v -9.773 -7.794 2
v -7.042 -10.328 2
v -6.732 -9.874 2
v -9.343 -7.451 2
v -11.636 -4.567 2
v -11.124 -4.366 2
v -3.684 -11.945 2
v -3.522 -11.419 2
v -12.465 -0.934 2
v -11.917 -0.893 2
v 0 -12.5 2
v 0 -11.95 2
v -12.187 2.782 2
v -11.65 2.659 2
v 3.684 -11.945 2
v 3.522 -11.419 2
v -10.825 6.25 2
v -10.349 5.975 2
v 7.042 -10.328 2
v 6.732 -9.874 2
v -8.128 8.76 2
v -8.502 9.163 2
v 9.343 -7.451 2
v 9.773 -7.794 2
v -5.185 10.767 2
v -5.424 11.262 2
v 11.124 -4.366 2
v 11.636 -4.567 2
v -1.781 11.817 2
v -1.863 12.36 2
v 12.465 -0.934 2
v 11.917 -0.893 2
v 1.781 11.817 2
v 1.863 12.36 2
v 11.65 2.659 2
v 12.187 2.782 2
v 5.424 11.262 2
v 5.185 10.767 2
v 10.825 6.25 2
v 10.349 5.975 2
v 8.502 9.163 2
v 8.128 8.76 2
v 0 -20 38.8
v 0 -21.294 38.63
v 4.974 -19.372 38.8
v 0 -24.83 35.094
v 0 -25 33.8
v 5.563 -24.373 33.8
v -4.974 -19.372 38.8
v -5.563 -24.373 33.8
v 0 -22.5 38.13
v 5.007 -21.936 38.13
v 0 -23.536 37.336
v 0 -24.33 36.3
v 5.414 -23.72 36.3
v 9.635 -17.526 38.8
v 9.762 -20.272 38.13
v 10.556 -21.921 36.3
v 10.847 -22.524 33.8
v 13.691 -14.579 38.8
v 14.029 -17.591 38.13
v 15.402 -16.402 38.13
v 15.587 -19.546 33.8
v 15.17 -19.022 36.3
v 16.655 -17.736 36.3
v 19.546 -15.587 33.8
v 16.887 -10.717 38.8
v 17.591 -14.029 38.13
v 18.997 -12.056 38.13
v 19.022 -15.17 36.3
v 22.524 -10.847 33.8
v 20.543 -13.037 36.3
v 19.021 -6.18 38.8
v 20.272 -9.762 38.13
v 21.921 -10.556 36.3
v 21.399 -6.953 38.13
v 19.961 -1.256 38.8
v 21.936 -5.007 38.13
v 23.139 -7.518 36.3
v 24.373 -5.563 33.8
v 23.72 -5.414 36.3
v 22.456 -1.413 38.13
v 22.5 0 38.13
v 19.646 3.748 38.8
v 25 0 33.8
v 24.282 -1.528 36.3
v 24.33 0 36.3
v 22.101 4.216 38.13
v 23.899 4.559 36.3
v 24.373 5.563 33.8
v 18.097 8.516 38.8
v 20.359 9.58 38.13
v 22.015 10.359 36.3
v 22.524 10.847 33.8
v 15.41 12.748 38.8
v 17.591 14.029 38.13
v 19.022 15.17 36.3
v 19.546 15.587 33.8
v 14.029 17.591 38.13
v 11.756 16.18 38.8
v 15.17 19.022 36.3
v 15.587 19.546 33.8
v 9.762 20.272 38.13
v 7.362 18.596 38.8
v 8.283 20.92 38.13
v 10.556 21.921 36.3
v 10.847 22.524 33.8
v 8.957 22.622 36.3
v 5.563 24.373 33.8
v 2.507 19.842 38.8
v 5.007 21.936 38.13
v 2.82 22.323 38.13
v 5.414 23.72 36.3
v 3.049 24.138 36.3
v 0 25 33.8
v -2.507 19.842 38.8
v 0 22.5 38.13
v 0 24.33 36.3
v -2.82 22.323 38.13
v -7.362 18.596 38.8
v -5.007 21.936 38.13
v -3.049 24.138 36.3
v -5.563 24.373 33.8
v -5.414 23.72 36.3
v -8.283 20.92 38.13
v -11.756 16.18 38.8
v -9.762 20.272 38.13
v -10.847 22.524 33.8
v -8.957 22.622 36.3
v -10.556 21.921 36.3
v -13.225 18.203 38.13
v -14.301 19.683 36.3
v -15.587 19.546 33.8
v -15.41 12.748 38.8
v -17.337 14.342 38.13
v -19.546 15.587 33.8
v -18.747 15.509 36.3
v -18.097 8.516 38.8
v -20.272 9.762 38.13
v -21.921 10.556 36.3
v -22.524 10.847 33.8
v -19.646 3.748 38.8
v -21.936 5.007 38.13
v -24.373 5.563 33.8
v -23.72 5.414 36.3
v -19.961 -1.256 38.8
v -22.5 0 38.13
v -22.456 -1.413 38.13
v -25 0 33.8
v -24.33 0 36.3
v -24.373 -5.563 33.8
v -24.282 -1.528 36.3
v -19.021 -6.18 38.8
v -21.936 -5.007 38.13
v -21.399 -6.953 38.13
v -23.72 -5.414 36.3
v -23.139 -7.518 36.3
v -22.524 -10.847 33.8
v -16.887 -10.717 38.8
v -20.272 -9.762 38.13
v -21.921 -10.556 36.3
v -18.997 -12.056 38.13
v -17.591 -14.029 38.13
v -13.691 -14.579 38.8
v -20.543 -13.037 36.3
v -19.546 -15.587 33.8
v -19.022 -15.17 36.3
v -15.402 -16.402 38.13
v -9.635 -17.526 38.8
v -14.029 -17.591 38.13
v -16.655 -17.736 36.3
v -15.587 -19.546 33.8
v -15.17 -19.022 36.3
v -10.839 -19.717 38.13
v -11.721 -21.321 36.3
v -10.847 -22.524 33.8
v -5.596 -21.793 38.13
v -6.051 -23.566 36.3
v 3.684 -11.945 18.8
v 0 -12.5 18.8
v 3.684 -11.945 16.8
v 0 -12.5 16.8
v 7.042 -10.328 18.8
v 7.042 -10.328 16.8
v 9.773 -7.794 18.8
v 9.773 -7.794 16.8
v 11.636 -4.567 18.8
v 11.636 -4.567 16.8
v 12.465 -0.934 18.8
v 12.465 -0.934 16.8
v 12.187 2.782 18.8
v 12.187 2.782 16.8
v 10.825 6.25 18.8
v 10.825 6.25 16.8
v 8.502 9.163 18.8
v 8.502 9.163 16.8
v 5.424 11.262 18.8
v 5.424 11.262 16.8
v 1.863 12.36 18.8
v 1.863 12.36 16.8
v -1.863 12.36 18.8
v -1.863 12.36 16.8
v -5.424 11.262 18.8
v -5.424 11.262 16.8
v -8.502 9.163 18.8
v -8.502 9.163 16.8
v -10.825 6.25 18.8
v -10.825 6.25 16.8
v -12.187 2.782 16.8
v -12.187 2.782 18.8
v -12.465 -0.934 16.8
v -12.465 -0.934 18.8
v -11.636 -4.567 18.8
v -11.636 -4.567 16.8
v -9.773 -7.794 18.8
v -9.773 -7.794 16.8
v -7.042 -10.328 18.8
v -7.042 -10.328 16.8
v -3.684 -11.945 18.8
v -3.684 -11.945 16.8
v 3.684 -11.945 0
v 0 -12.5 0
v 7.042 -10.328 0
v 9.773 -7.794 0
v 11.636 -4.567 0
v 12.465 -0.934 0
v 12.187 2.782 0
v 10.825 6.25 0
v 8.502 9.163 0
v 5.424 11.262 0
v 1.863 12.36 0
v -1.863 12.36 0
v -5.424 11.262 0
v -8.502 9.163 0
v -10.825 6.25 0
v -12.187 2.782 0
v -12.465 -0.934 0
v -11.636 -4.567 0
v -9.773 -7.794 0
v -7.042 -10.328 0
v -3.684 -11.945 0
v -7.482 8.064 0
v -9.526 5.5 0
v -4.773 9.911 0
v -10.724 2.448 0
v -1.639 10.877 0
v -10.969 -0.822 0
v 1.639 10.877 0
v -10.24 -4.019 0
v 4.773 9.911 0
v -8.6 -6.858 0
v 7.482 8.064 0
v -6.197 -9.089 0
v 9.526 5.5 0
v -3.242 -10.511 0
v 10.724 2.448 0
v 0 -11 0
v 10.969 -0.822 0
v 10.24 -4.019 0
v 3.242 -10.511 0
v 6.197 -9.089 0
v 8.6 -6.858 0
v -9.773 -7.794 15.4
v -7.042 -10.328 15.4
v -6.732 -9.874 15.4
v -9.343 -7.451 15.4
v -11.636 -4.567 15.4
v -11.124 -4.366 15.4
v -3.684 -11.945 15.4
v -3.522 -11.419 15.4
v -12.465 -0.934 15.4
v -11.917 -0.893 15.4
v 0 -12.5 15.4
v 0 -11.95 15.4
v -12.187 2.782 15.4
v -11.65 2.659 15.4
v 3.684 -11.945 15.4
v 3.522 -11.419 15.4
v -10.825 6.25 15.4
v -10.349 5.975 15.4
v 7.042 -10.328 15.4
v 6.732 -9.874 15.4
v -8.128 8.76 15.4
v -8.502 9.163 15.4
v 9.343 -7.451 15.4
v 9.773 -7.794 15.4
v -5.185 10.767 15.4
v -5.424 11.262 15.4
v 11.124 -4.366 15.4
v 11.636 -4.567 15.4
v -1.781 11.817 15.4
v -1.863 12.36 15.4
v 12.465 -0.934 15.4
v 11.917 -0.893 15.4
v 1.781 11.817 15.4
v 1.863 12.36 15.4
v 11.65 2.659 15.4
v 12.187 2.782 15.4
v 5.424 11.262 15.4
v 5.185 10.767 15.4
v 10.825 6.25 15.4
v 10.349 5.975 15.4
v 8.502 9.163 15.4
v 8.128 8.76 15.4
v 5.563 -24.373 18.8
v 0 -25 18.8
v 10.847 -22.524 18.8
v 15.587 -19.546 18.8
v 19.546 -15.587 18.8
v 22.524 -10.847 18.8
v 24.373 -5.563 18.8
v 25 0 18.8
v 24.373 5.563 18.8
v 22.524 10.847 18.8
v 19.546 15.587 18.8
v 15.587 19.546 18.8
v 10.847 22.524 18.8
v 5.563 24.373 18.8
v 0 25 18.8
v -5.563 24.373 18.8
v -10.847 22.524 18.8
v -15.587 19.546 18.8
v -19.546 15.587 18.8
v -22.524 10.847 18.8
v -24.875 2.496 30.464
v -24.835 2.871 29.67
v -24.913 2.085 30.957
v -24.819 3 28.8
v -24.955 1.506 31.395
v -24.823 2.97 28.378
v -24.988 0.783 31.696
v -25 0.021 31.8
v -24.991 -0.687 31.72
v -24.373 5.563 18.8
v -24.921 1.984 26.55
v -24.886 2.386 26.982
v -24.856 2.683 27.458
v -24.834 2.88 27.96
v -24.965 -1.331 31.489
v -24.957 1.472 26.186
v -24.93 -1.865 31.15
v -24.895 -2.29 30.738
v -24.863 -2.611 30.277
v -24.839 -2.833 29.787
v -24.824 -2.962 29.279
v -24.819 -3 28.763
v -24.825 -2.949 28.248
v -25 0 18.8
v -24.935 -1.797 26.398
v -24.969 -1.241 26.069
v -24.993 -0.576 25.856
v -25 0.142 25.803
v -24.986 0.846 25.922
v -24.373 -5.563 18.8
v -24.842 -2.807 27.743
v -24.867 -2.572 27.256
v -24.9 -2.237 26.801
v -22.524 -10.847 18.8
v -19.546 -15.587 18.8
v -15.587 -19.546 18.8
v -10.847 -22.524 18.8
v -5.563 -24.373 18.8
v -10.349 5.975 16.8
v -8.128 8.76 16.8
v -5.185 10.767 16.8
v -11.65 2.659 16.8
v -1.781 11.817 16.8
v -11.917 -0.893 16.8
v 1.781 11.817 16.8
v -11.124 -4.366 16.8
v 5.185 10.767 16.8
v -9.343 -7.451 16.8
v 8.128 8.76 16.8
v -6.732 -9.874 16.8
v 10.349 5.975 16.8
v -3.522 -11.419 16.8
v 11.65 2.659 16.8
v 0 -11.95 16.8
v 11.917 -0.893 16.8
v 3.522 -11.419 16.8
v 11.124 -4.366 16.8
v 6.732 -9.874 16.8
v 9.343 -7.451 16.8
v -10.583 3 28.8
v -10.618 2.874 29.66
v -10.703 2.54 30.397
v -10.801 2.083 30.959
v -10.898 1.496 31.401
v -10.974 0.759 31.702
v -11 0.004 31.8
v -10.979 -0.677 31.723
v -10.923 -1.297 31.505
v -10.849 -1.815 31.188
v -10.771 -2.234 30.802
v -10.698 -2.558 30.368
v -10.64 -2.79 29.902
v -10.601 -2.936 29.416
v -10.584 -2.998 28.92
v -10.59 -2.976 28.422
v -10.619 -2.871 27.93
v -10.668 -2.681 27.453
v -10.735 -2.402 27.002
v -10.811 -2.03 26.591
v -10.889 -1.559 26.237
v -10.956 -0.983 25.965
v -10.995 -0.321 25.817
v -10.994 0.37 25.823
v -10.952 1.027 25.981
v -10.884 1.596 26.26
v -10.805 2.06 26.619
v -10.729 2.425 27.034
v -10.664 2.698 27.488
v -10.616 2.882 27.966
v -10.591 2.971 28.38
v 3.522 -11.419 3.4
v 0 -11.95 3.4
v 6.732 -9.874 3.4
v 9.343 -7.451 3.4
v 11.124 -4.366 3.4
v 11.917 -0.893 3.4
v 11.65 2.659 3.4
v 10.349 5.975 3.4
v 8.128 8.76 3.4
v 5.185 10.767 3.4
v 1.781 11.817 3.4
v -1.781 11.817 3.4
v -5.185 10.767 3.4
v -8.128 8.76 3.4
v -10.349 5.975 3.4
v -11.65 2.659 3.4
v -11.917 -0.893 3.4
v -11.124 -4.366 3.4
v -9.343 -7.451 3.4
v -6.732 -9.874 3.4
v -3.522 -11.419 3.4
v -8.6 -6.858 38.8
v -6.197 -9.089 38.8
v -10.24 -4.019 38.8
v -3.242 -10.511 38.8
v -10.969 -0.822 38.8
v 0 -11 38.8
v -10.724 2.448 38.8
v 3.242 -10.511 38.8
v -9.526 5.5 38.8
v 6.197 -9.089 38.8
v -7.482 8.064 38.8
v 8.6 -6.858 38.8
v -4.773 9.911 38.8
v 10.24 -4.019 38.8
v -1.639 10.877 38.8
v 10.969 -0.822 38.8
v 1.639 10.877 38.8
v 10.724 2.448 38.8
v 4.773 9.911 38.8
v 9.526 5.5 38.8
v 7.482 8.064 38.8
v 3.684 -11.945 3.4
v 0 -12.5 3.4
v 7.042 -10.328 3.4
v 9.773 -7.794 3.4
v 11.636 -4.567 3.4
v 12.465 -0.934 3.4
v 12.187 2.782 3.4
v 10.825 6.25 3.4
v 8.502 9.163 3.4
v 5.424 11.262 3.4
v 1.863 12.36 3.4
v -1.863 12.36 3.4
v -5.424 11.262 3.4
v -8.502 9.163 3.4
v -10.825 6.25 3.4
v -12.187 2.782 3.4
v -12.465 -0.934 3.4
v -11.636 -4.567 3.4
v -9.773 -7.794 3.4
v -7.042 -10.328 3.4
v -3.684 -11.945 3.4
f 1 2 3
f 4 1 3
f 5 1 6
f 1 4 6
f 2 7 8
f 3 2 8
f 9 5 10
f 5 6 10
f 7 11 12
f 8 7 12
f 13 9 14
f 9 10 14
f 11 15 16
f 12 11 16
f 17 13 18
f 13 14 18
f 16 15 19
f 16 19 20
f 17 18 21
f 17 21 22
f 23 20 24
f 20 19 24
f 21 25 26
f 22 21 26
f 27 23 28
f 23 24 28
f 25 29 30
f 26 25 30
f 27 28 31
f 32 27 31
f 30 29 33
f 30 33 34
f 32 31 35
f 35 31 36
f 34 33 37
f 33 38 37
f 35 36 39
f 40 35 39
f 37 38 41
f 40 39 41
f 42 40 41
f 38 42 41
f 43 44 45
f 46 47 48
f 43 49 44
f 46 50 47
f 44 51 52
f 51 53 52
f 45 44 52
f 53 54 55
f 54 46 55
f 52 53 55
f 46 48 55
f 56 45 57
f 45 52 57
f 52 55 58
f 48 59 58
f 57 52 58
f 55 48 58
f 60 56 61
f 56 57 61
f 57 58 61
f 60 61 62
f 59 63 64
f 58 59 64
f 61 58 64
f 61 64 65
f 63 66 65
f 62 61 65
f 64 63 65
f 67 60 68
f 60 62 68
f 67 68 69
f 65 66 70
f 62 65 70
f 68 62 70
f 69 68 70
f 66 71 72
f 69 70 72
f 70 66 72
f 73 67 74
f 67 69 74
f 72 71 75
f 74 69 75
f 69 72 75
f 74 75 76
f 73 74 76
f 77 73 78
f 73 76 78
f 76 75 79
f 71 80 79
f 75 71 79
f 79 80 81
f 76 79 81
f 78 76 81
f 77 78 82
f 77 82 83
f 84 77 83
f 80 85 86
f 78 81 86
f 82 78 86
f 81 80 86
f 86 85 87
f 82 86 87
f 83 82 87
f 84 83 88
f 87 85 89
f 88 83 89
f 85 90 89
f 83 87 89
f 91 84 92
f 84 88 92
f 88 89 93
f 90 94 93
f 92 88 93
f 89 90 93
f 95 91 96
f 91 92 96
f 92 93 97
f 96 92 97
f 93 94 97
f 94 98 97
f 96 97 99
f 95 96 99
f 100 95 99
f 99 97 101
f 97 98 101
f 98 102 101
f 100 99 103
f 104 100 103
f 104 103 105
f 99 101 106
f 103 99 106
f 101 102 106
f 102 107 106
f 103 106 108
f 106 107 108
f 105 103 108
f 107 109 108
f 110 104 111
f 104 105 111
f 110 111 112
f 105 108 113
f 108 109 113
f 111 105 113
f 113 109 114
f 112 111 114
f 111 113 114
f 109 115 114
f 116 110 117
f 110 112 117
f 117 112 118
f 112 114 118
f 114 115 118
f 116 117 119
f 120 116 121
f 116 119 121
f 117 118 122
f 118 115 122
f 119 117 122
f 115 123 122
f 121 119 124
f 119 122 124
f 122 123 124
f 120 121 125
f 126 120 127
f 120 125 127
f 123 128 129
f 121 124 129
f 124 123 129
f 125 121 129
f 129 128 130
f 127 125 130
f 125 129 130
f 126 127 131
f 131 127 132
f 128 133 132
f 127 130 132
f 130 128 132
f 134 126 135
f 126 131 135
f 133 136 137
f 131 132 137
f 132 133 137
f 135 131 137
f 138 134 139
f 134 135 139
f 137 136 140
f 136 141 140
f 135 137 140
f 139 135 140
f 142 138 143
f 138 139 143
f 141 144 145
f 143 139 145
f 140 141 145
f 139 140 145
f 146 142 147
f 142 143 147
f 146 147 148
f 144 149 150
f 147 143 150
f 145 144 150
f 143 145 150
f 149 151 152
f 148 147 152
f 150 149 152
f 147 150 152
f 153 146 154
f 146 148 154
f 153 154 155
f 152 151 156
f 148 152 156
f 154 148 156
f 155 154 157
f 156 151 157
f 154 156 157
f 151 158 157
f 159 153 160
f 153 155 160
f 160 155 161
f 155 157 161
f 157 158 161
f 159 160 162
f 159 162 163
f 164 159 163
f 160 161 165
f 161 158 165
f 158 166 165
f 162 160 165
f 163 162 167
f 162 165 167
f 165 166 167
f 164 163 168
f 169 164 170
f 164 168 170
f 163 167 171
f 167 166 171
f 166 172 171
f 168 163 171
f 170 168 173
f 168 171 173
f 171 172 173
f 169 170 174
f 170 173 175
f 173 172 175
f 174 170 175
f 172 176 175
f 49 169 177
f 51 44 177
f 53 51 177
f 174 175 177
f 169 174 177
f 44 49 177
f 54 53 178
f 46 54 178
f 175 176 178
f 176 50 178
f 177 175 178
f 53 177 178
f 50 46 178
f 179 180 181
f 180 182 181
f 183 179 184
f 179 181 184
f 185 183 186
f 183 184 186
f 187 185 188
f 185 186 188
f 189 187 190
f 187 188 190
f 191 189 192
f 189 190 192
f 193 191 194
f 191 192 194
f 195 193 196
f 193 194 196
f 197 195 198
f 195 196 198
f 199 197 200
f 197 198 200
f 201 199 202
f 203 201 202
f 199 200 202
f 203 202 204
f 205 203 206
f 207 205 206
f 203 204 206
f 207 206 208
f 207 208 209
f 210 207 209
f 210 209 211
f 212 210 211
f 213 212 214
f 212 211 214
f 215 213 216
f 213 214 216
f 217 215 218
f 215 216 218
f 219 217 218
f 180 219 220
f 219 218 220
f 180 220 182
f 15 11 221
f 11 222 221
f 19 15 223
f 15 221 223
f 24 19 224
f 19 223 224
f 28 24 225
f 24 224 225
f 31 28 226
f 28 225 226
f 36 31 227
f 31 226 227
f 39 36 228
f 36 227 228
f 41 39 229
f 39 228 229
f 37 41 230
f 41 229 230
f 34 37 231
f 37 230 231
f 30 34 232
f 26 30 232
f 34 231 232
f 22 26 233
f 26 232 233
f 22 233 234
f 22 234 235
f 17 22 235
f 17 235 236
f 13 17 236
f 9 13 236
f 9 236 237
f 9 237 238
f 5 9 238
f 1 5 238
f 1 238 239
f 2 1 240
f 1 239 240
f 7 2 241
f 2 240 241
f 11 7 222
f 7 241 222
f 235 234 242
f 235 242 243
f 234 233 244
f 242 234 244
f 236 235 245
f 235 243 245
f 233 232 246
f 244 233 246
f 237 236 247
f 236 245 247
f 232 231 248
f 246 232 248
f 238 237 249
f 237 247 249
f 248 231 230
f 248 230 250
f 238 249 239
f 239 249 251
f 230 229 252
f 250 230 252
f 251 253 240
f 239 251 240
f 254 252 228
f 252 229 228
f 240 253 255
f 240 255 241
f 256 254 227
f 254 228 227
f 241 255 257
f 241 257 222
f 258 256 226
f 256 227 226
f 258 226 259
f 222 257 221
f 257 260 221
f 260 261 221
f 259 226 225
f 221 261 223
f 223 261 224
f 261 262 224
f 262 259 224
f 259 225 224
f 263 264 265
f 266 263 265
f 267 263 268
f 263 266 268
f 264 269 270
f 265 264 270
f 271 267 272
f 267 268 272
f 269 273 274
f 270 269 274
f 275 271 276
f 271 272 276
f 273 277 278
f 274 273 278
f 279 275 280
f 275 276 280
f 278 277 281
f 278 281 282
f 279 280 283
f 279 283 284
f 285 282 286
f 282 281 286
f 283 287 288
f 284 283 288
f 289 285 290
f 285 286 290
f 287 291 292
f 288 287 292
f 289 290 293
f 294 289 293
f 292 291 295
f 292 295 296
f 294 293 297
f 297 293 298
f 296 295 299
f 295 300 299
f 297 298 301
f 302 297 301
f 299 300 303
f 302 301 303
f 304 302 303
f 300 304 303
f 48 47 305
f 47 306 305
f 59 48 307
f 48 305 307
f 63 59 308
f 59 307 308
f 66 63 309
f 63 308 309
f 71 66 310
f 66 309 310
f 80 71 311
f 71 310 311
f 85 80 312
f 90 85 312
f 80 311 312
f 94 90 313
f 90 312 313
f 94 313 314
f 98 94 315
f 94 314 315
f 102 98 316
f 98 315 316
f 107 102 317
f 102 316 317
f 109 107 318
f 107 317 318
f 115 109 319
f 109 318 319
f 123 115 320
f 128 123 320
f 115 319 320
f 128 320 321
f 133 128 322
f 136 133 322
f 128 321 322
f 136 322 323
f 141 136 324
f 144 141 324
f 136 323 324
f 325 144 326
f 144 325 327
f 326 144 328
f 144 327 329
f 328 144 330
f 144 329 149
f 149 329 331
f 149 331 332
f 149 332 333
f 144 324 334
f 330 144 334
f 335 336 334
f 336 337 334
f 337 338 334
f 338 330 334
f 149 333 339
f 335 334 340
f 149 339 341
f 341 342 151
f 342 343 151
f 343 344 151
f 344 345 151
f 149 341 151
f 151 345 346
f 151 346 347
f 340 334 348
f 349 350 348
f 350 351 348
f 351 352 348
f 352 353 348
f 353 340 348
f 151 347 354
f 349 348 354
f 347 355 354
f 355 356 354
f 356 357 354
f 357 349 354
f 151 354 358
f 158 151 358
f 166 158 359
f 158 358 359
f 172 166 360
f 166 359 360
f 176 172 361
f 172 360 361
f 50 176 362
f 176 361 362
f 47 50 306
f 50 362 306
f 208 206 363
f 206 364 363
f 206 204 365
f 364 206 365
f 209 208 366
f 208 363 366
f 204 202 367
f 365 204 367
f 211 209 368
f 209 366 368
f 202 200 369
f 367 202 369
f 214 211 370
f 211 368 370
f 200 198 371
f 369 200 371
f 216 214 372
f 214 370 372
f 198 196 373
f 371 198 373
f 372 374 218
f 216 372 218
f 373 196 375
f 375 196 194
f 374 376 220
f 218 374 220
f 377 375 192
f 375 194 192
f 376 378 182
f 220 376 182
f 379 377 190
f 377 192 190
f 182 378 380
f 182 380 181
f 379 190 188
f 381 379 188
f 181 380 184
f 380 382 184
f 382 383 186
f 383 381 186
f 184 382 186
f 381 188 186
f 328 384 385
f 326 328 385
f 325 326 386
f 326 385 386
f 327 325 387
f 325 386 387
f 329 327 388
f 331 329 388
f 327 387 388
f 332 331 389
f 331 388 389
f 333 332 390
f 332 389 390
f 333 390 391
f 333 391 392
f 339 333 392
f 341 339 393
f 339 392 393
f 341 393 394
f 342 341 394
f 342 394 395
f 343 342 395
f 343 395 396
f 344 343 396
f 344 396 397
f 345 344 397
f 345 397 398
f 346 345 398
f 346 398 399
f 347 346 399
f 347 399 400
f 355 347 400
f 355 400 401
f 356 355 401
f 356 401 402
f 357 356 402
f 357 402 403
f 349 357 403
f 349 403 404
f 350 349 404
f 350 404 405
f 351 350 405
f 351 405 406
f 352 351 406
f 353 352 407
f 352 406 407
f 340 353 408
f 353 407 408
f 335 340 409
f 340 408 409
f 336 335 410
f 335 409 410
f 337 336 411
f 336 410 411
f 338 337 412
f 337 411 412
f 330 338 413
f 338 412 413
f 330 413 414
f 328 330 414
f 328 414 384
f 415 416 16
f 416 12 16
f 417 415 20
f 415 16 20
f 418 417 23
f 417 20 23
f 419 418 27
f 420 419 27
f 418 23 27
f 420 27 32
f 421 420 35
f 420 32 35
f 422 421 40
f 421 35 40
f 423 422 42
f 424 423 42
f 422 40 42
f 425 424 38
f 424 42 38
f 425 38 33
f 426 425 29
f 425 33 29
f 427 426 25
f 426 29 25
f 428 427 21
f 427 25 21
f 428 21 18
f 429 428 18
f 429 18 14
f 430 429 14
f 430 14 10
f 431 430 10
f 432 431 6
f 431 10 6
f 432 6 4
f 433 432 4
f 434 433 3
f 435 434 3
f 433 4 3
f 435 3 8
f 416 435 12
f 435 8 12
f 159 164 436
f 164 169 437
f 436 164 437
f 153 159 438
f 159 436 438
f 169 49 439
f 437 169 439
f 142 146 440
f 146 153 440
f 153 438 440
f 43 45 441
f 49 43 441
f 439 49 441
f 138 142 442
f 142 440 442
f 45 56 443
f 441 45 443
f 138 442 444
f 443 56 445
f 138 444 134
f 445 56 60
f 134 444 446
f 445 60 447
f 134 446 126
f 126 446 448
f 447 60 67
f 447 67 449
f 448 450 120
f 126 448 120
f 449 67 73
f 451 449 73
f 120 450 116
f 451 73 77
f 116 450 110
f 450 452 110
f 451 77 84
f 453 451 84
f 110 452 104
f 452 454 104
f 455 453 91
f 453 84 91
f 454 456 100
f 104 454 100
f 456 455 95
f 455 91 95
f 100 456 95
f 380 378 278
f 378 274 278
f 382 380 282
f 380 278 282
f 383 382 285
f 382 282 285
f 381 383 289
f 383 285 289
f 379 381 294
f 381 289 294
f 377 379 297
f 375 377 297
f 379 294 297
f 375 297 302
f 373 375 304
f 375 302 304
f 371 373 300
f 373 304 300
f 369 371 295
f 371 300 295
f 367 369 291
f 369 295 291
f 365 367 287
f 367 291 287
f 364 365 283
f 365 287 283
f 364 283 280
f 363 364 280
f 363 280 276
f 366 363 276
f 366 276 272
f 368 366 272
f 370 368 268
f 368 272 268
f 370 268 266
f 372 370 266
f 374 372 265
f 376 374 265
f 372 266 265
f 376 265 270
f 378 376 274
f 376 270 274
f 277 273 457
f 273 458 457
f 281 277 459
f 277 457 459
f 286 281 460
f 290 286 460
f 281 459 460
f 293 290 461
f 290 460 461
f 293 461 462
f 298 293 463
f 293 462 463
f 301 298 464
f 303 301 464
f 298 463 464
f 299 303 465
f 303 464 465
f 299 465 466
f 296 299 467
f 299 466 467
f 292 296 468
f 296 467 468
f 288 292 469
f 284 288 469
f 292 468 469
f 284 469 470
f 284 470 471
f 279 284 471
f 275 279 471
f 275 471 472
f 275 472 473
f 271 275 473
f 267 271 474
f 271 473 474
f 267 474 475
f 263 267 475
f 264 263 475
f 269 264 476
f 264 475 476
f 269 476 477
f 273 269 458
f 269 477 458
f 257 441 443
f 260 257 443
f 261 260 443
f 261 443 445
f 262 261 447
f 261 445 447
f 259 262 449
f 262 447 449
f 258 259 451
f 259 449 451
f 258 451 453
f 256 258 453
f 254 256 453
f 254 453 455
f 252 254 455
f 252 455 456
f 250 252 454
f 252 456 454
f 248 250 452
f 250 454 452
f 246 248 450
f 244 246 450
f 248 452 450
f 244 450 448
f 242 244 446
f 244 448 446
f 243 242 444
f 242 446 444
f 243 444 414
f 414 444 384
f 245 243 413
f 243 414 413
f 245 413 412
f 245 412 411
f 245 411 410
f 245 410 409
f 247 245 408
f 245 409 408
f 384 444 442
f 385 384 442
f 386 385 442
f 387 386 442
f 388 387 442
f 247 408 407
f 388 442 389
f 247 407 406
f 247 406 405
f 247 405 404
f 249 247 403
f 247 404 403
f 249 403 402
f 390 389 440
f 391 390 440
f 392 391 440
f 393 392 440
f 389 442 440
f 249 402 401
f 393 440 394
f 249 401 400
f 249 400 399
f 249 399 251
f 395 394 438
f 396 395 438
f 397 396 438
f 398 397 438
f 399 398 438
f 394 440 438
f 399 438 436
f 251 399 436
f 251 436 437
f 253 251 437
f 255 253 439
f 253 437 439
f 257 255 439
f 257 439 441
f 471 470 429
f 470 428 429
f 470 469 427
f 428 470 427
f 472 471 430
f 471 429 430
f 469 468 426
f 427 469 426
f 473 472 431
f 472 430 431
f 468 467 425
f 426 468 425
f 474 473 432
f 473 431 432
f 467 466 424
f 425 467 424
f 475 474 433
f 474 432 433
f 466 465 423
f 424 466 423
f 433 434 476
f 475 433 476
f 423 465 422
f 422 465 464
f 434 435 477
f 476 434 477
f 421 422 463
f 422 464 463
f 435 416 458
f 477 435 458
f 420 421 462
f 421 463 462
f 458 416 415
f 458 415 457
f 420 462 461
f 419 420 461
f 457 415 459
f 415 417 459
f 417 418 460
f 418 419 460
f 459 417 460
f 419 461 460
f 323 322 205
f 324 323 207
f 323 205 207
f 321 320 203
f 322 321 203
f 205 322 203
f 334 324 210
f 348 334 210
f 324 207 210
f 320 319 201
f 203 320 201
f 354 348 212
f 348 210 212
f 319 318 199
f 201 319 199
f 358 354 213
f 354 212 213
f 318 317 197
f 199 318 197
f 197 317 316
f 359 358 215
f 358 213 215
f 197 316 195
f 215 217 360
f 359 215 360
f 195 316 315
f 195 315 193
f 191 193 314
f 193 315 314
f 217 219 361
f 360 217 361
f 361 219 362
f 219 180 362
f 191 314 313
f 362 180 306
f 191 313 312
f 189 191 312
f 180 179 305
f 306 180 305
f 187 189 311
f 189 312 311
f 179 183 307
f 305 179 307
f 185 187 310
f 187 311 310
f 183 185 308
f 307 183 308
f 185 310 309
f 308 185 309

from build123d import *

# Parameters (mm, degrees)
F2_R     = 5
F4_D     = 6
F4_DEPTH = 25.001


with BuildPart() as f1:
    # F0 (on Right) → F1 (revolve)
    with BuildSketch(Plane.YZ):
        Polygon((-12.5, 0), (-11, 0), (-11, 38.8), (-25, 38.8), (-25, 18.8), (-12.5, 18.8), (-12.5, 16.8), (-11.95, 16.8), (-11.95, 15.4), (-12.5, 15.4), (-12.5, 3.4), (-11.95, 3.4), (-11.95, 2), (-12.5, 2), align=None)
    revolve(axis=Axis((0, 0, 19.5372104645), (0, 0, 1)))

    # F2
    f2_edges = [f1.edges().sort_by_distance(p)[0] for p in [
        (0, 25, 38.8),
    ]]
    fillet(f2_edges, radius=F2_R)

    # F4 (through all, one way)
    with BuildSketch(Plane.YZ):
        with Locations((0, 28.8)):
            Circle(F4_D / 2)
    extrude(amount=-F4_DEPTH, mode=Mode.SUBTRACT)


solid = f1.part
